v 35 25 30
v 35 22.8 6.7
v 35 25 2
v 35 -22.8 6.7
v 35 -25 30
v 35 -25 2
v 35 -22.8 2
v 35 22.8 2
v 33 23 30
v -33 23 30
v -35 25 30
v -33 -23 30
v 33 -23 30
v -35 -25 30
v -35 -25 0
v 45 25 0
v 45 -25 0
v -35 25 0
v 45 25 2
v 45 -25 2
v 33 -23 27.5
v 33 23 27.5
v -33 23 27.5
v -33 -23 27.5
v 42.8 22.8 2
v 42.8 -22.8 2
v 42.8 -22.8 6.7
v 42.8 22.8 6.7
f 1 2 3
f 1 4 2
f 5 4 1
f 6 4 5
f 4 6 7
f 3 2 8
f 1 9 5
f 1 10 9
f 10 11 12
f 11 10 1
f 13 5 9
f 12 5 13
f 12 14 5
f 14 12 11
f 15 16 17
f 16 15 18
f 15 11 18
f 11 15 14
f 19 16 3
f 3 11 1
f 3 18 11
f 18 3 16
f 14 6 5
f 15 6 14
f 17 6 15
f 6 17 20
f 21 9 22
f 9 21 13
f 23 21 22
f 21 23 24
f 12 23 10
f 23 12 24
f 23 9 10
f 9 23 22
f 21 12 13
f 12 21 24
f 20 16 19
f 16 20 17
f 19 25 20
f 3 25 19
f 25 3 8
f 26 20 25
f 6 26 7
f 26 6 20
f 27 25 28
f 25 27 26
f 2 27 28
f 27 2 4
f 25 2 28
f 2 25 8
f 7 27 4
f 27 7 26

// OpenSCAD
// Two-part enclosure for a small electronics board (e.g. Arduino-based temperature logger)
// Print orientation: both parts lie on the bed (z = 0), side by side, with a 10 mm gap.
// Units: mm.

// ---------------- Parameters ----------------
box_x      = 70;    // box outer length (X)
box_y      = 50;    // box outer width (Y)
box_z      = 30;    // box outer height (Z)
wall       = 2;     // box wall thickness
floor      = 2;     // box floor thickness
lip_t      = 1.5;   // lid lip wall thickness
lip_h      = 4;     // lid lip height (from plate top)
lip_outer_x = 65.6; // outer size of lip in X
lip_outer_y = 45.6; // outer size of lip in Y
clearance  = 0.2;   // clearance between lip and box opening (each side)
eps        = 0.5;   // cutter overshoot past faces
gap        = 10;    // gap between the two printed parts

$fn = 64;

// Derived: box opening (inner size)
opening_x = box_x - 2 * wall;   // 66
opening_y = box_y - 2 * wall;   // 46

// Derived: lip overshoot so it passes the opening + clearance
lip_overshoot = clearance + eps; // 2.7

// ---------------- Modules ----------------
module box() {
    difference() {
        translate([-box_x/2, -box_y/2, 0])
            cube([box_x, box_y, box_z]);
        // open top: empty space from z = box_z - floor up to the top face
        translate([-opening_x/2, -opening_y/2, box_z - floor - eps])
            cube([opening_x, opening_y, floor + 2*eps]);
    }
}

module lid() {
    // Plate lying on the bed
    translate([-box_x/2, -box_y/2, 0])
        cube([box_x, box_y, 2]);
    // Rectangular lip on top, centred, with overshoot past the opening
    translate([-lip_outer_x/2, -lip_outer_y/2, 2])
        cube([lip_outer_x, lip_outer_y, lip_h + lip_overshoot]);
}

// ---------------- Assembly ----------------
union() {
    box();
    translate([gap, 0, 0])
        lid();
}
